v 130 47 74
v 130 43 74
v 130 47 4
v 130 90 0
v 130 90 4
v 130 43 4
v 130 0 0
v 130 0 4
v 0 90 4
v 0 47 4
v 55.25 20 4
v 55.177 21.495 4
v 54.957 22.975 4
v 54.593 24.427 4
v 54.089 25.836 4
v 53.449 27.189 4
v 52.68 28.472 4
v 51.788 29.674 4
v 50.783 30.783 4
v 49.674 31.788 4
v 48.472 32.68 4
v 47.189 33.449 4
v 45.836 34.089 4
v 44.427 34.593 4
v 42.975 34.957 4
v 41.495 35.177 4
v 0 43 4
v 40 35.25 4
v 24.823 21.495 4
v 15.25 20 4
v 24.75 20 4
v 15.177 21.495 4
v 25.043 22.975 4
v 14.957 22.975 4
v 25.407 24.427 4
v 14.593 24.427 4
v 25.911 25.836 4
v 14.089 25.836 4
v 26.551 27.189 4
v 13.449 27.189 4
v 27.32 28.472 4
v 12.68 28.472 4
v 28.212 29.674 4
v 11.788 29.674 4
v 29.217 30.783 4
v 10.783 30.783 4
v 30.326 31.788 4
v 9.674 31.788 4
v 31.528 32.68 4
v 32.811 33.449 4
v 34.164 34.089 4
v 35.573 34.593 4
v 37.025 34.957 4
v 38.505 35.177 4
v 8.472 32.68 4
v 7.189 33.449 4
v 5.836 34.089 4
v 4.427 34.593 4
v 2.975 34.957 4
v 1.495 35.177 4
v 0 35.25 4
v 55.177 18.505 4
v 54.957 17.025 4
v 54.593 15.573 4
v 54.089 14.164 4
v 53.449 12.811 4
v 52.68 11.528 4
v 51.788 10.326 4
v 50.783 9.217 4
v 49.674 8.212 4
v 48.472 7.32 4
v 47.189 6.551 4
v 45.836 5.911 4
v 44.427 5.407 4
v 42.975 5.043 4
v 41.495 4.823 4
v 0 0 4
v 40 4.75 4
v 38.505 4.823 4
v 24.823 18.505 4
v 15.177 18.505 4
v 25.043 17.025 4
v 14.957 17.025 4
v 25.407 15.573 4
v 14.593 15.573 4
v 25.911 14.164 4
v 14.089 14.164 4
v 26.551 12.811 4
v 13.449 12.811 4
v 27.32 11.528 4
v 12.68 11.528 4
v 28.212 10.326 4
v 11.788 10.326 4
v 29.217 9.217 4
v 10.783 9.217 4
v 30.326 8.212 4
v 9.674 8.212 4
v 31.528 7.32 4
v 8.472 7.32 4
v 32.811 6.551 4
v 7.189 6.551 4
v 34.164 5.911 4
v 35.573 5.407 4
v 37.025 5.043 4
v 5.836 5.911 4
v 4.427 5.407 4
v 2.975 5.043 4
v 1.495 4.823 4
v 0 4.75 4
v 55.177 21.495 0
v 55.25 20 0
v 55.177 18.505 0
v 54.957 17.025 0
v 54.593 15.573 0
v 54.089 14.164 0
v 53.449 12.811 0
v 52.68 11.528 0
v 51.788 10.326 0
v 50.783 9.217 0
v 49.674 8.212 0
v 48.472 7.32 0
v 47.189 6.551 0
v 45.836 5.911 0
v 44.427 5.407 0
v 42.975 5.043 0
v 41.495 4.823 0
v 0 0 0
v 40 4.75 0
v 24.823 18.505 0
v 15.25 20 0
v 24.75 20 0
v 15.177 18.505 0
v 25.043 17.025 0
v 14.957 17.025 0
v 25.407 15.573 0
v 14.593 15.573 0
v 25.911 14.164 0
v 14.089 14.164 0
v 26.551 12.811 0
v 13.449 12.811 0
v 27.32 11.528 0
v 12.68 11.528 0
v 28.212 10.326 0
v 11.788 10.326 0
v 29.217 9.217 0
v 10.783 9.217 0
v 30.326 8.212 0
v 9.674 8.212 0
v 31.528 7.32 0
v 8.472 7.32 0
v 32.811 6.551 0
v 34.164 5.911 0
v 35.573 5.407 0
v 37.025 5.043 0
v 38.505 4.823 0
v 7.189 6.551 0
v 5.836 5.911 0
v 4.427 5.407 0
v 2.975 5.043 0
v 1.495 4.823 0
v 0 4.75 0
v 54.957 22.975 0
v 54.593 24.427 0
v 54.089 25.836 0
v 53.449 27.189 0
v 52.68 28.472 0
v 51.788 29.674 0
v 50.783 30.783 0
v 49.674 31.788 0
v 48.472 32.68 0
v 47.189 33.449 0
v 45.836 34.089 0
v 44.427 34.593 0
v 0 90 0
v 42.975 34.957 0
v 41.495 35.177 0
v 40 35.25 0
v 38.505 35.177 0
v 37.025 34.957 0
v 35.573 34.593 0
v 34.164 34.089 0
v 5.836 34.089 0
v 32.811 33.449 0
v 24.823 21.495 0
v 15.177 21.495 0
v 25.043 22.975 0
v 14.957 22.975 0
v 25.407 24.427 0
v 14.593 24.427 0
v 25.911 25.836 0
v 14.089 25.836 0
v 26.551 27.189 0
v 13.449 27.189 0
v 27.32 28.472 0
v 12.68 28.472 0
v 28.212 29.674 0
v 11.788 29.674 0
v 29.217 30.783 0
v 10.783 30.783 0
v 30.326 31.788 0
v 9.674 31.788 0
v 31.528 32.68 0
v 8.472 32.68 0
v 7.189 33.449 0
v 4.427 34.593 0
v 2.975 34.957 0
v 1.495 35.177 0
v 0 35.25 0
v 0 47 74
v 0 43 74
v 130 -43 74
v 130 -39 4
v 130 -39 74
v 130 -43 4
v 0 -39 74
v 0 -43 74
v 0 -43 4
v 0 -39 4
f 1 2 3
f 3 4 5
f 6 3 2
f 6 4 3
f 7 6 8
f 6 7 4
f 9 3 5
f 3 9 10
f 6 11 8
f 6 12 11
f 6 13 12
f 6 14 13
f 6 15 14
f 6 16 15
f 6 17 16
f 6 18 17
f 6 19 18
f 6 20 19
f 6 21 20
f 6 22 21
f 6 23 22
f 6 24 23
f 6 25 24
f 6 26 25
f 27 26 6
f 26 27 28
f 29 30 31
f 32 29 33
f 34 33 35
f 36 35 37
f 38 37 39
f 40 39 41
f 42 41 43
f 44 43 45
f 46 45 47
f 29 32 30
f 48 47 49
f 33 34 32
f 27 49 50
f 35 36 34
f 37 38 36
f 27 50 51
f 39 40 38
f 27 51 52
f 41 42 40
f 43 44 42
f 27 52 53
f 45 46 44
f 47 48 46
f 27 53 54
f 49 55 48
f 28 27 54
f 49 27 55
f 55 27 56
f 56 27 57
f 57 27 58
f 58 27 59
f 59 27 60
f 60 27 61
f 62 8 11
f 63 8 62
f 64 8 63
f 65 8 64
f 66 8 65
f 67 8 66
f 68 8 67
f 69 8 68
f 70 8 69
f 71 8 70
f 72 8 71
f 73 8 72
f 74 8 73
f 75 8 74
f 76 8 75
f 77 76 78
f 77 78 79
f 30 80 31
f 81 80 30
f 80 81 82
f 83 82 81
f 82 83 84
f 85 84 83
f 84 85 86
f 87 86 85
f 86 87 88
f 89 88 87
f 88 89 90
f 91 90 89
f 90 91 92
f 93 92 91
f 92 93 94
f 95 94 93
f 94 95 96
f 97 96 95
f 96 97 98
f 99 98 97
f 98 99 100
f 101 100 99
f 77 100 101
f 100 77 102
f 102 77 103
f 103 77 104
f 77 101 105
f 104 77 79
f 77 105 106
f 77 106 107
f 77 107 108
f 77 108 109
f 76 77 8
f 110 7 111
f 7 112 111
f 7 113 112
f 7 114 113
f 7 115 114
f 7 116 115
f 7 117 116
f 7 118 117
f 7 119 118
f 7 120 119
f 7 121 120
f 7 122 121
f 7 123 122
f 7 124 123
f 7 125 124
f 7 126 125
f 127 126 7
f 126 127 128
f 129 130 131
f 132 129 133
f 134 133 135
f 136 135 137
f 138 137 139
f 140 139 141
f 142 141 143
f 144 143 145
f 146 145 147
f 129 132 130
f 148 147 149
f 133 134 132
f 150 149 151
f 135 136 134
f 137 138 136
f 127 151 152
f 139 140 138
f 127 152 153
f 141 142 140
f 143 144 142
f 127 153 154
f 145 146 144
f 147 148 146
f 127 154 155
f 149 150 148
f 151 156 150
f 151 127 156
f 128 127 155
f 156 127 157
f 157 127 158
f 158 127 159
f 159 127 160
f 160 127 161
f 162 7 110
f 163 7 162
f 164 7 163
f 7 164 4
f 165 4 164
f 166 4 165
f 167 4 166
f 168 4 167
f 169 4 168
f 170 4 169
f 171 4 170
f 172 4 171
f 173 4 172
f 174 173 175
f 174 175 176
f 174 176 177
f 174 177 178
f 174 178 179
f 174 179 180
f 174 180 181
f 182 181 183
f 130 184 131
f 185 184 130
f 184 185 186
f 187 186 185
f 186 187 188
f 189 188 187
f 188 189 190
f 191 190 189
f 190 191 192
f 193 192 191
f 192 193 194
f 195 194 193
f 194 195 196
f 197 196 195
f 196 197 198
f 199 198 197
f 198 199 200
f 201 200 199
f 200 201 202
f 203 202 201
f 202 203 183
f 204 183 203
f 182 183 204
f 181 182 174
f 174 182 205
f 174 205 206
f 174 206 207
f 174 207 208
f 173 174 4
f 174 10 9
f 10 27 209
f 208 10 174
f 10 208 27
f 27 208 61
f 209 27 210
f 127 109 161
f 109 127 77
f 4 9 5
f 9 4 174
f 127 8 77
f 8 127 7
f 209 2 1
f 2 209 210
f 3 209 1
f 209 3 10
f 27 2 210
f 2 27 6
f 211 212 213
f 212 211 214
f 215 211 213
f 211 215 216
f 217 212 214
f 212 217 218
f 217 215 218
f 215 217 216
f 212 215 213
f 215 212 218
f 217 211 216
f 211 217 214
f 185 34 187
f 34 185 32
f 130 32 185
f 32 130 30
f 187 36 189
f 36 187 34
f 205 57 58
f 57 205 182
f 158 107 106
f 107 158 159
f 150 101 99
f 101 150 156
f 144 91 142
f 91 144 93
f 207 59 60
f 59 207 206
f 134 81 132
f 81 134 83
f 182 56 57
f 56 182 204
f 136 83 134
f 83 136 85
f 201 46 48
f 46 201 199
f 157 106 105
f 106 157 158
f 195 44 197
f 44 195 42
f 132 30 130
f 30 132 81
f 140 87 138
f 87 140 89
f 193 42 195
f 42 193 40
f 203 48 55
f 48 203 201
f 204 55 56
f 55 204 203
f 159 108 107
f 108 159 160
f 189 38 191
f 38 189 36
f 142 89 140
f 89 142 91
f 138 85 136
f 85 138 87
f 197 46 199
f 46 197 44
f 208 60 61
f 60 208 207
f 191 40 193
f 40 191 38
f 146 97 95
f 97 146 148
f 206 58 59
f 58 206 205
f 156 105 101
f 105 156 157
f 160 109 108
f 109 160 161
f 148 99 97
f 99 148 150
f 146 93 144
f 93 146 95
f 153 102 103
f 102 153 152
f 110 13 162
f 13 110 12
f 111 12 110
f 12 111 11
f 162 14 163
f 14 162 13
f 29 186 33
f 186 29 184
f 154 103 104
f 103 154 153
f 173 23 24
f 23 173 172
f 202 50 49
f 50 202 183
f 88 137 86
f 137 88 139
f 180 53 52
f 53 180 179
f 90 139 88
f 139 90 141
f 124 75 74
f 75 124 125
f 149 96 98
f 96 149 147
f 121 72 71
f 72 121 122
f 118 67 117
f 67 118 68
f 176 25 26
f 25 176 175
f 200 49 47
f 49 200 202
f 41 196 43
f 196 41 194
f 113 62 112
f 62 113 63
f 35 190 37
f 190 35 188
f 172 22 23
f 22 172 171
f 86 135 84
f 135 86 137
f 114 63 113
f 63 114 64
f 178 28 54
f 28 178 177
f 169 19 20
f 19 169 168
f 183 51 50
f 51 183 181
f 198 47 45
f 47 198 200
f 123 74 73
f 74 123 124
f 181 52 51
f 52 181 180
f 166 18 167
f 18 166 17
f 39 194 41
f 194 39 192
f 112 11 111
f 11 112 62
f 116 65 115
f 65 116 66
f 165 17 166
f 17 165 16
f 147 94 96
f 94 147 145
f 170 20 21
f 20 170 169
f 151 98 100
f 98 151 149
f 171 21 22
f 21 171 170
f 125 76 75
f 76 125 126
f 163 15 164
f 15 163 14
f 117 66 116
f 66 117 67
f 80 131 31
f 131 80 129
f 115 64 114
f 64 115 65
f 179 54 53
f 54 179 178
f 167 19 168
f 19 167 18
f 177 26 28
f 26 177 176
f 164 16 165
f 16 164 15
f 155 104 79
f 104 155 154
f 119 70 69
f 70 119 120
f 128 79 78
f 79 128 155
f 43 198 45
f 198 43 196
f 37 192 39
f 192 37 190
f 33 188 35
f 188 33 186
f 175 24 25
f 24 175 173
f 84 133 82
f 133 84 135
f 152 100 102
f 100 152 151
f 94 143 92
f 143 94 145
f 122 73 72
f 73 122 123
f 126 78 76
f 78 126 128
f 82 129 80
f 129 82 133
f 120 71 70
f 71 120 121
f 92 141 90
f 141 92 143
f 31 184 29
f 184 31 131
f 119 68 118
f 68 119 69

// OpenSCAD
// Rack for six 50 mL conical (Falcon-type) tubes
// Print orientation: flat plate on bed (z=0), walls rise up.
// After printing, flip over so walls are on bottom and tubes pass through holes.

// --- Plate dimensions ---
plate_x = 130;       // Plate length (X)
plate_y = 90;         // Plate width (Y)
plate_z = 4;          // Plate thickness

// --- Hole pattern ---
hole_dia = 30.5;     // Hole diameter
hole_rows = 2;        // Number of rows (along Y)
hole_cols = 3;        // Number of columns (along X)
pitch_x = 40;         // Centre-to-centre spacing in X
pitch_y = 40;          // Centre-to-centre spacing in Y

// --- Wall dimensions ---
wall_length = 130;    // Wall length (X), flush with plate long edge
wall_thick = 4;       // Wall thickness (Y)
wall_height = 70;     // Wall height from plate top

// --- Derived values ---
// Hole centres: centred on plate in X and Y
hole_x_start = -(hole_cols - 1) * pitch_x / 2;
hole_y_start = -(hole_rows - 1) * pitch_y / 2;

// Wall position: flush with plate long edge (Y = ±plate_y/2)
wall_y_pos = plate_y / 2;

// --- Build the part ---
difference() {
    // Plate and walls as a single connected body
    union() {
        // Main plate body
        cube([plate_x, plate_y, plate_z], center = [false, false, false]);
        
        // Two walls along long edges (Y = ±plate_y/2)
        // Wall along Y = +plate_y/2 (extends from plate top)
        translate([0, wall_y_pos - wall_thick/2, plate_z])
            cube([wall_length, wall_thick, wall_height], center = [false, false, false]);
        
        // Wall along Y = -plate_y/2 (extends from plate top)
        translate([0, -wall_y_pos + wall_thick/2, plate_z])
            cube([wall_length, wall_thick, wall_height], center = [false, false, false]);
    }
    
    // Cut through-holes
    for (i = [0 : hole_cols - 1]) {
        for (j = [0 : hole_rows - 1]) {
            hx = hole_x_start + i * pitch_x;
            hy = hole_y_start + j * pitch_y;
            
            translate([hx, hy, -0.01])
                cylinder(d = hole_dia, h = plate_z + 0.02, $fn = 64);
        }
    }
}
